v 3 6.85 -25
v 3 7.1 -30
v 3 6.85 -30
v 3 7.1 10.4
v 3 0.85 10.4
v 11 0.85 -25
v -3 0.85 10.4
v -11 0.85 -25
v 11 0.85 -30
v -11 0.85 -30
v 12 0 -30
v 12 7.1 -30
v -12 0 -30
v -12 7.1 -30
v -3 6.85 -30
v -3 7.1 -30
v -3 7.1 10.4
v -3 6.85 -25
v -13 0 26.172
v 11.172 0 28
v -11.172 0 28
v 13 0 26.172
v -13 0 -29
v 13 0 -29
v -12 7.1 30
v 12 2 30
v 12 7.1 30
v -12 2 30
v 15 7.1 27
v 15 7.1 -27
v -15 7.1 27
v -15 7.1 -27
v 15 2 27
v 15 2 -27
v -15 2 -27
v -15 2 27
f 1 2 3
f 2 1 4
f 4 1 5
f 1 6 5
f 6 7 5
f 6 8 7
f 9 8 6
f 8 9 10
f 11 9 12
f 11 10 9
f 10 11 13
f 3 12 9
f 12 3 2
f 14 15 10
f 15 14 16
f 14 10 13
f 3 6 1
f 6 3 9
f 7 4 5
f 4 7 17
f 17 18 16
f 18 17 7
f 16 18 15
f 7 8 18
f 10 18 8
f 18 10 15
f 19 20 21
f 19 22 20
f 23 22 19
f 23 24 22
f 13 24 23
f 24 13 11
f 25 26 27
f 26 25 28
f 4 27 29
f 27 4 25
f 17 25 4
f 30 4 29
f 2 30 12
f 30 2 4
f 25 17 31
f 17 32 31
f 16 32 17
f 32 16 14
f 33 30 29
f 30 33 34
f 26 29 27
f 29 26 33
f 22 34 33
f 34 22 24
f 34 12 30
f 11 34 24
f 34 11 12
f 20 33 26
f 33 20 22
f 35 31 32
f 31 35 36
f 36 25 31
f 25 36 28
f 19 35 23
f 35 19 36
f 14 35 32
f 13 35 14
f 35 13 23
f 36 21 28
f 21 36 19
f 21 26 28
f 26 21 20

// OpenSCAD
// file: peglock_modules.scad
default_peg_diameter=6;
default_peg_spacing=25.4;
default_highpeg_stickout=4.6;
default_highpeg_angleout=8;
default_highpeg_stickup=6;
default_lowpeg_stickout=8;

default_base_width=30;
default_base_height=60;

$peg_diameter = default_peg_diameter;
$peg_spacing = default_peg_spacing;
$highpeg_stickout = default_highpeg_stickout;
$highpeg_angleout = default_highpeg_angleout;
$highpeg_stickup = default_highpeg_stickup;
$lowpeg_stickout = default_lowpeg_stickout;

$base_width = default_base_width;
$base_height = default_base_height;

$peg_radius = default_peg_diameter / 2;
$holder_height = 25.4 + 6 + 4;

module peglockInit(
    peg_diameter = default_peg_diameter,
    peg_spacing = default_peg_spacing,
    highpeg_stickout = default_highpeg_stickout,
    highpeg_angleout = default_highpeg_angleout,
    highpeg_stickup = default_highpeg_stickup,
    lowpeg_stickout = default_lowpeg_stickout,
    base_width = default_base_width,
    base_height = default_base_height
    ) {
    $peg_diameter = peg_diameter;
    $peg_spacing = peg_spacing;
    $highpeg_stickout = highpeg_stickout;
    $highpeg_angleout = highpeg_angleout;
    $highpeg_stickup = highpeg_stickup;
    $lowpeg_stickout = lowpeg_stickout;
    $base_width = base_width;
    $base_height = base_height;

    $peg_radius = $peg_diameter/2;
    $holder_height = 25.4 + 6 + 4;

    children();
}

module quartersphere(radius=$peg_radius) {
    rotate_extrude(angle=-180, $fn=42) intersection() {
        square(radius);
        circle(radius, $fn=42);
    };
}

module halfcylinder(length, radius=$peg_radius) {
    rotate_extrude(angle=-180, $fn=42) square([radius,length]);
    translate([0,0,length]) children();
}

module angledhalfcylinder(length, radius=$peg_radius) {
    intersection() {
        multmatrix([
            [1, 0,-1, 0],
            [0, 1, 0, 0],
            [0, 0, 1, 0]
        ])
        halfcylinder(length + radius, radius);
        
        translate([-length, -radius, 0])
        cube([length + radius, radius, length + radius]);
    };

    translate([-length, 0, length])
    rotate([0,-90,0])
    children();
}

module double(v=[1,0,0]) {
    children();
    mirror(v) children();
}

module halfHolder(is_cutting=false) {
    translate(is_cutting ? [0,0,-5] : [0,0,0])
    cube([3,6,$holder_height] + (is_cutting ? [0,.25,5] : [0,0,0]));

    translate([3,0,0]) {
        linear_extrude($holder_height, scale=0)
        polygon([[0,0], [8,0], [0,6]]);

        if (is_cutting) {
            translate([0,0,-5]) 
            linear_extrude(5) 
            polygon([[0,0], [8,0], [0,6]]);
        }
    }
}

module holder(is_cutting=false) {
    double() halfHolder(is_cutting); 
}

module halfPeglockAttachment() {
    translate([0, -$holder_height/2]) rotate([-90,0,0]) rotate([0,0,-90])
    halfHolder();

    translate([6, -$peg_spacing/2]) rotate([-90,0,-90])
    halfcylinder($lowpeg_stickout)
    quartersphere();
    
    translate([6, +$peg_spacing/2]) rotate([-90,0,-90])
    halfcylinder($highpeg_stickout)
    angledhalfcylinder($highpeg_angleout)
    halfcylinder($highpeg_stickup)
    quartersphere();
}

module peglockAttachment() {
    difference() {
        union() {
            double() translate([.25,0,0]) halfPeglockAttachment();
            linear_extrude(.2) square([.5,$holder_height], center=true); 
        }
        translate([0,0,-.5]) linear_extrude(12) square([6.5,14], center=true); 
    }
}

module chamfer(pt, v0, v1, v2) {
    multmatrix([
        [v0[0],v1[0],v2[0],pt[0]],
        [v0[1],v1[1],v2[1],pt[1]],
        [v0[2],v1[2],v2[2],pt[2]],
    ]) 
    linear_extrude(1) polygon([[0,0],[1,0],[0,1]]);

    translate(pt) cube(1, center=true);
}

module peglockBase(
    width=$base_width,
    height=$base_height
) {
    topright = [width/2, 0, height/2];
    depth = [0, 6.25+.85, 0];

    render() difference() {
        translate(-topright)
        cube(topright * 2 + depth);

        translate([0, .85, 5-height/2]) 
        holder(is_cutting=true);

        double([1,0,0]) {
            double([0,0,1]) {
                chamfer(topright, [-3,0,0], [0,0,-3], depth);
                chamfer(topright, [-2,0,0], [0,2,0], [0,0,-height/2]);
            }
            translate(topright - [0,0,3]) rotate([0,45,0]) chamfer([0,0,0], [0,0,-2], [0,2,0], [-sqrt(18),0,0]);
        }
        chamfer(topright, [0,0,-2], [0,2,0], [-width,0,0]);        
    }
}
// main file
use <peglock_modules.scad>

base_width = 25; // [22:.1:30]
base_height = 50; // [42:.1:60]

peglockInit(
    base_width = base_width,
    base_height = base_height) {
    peglockBase();
}
